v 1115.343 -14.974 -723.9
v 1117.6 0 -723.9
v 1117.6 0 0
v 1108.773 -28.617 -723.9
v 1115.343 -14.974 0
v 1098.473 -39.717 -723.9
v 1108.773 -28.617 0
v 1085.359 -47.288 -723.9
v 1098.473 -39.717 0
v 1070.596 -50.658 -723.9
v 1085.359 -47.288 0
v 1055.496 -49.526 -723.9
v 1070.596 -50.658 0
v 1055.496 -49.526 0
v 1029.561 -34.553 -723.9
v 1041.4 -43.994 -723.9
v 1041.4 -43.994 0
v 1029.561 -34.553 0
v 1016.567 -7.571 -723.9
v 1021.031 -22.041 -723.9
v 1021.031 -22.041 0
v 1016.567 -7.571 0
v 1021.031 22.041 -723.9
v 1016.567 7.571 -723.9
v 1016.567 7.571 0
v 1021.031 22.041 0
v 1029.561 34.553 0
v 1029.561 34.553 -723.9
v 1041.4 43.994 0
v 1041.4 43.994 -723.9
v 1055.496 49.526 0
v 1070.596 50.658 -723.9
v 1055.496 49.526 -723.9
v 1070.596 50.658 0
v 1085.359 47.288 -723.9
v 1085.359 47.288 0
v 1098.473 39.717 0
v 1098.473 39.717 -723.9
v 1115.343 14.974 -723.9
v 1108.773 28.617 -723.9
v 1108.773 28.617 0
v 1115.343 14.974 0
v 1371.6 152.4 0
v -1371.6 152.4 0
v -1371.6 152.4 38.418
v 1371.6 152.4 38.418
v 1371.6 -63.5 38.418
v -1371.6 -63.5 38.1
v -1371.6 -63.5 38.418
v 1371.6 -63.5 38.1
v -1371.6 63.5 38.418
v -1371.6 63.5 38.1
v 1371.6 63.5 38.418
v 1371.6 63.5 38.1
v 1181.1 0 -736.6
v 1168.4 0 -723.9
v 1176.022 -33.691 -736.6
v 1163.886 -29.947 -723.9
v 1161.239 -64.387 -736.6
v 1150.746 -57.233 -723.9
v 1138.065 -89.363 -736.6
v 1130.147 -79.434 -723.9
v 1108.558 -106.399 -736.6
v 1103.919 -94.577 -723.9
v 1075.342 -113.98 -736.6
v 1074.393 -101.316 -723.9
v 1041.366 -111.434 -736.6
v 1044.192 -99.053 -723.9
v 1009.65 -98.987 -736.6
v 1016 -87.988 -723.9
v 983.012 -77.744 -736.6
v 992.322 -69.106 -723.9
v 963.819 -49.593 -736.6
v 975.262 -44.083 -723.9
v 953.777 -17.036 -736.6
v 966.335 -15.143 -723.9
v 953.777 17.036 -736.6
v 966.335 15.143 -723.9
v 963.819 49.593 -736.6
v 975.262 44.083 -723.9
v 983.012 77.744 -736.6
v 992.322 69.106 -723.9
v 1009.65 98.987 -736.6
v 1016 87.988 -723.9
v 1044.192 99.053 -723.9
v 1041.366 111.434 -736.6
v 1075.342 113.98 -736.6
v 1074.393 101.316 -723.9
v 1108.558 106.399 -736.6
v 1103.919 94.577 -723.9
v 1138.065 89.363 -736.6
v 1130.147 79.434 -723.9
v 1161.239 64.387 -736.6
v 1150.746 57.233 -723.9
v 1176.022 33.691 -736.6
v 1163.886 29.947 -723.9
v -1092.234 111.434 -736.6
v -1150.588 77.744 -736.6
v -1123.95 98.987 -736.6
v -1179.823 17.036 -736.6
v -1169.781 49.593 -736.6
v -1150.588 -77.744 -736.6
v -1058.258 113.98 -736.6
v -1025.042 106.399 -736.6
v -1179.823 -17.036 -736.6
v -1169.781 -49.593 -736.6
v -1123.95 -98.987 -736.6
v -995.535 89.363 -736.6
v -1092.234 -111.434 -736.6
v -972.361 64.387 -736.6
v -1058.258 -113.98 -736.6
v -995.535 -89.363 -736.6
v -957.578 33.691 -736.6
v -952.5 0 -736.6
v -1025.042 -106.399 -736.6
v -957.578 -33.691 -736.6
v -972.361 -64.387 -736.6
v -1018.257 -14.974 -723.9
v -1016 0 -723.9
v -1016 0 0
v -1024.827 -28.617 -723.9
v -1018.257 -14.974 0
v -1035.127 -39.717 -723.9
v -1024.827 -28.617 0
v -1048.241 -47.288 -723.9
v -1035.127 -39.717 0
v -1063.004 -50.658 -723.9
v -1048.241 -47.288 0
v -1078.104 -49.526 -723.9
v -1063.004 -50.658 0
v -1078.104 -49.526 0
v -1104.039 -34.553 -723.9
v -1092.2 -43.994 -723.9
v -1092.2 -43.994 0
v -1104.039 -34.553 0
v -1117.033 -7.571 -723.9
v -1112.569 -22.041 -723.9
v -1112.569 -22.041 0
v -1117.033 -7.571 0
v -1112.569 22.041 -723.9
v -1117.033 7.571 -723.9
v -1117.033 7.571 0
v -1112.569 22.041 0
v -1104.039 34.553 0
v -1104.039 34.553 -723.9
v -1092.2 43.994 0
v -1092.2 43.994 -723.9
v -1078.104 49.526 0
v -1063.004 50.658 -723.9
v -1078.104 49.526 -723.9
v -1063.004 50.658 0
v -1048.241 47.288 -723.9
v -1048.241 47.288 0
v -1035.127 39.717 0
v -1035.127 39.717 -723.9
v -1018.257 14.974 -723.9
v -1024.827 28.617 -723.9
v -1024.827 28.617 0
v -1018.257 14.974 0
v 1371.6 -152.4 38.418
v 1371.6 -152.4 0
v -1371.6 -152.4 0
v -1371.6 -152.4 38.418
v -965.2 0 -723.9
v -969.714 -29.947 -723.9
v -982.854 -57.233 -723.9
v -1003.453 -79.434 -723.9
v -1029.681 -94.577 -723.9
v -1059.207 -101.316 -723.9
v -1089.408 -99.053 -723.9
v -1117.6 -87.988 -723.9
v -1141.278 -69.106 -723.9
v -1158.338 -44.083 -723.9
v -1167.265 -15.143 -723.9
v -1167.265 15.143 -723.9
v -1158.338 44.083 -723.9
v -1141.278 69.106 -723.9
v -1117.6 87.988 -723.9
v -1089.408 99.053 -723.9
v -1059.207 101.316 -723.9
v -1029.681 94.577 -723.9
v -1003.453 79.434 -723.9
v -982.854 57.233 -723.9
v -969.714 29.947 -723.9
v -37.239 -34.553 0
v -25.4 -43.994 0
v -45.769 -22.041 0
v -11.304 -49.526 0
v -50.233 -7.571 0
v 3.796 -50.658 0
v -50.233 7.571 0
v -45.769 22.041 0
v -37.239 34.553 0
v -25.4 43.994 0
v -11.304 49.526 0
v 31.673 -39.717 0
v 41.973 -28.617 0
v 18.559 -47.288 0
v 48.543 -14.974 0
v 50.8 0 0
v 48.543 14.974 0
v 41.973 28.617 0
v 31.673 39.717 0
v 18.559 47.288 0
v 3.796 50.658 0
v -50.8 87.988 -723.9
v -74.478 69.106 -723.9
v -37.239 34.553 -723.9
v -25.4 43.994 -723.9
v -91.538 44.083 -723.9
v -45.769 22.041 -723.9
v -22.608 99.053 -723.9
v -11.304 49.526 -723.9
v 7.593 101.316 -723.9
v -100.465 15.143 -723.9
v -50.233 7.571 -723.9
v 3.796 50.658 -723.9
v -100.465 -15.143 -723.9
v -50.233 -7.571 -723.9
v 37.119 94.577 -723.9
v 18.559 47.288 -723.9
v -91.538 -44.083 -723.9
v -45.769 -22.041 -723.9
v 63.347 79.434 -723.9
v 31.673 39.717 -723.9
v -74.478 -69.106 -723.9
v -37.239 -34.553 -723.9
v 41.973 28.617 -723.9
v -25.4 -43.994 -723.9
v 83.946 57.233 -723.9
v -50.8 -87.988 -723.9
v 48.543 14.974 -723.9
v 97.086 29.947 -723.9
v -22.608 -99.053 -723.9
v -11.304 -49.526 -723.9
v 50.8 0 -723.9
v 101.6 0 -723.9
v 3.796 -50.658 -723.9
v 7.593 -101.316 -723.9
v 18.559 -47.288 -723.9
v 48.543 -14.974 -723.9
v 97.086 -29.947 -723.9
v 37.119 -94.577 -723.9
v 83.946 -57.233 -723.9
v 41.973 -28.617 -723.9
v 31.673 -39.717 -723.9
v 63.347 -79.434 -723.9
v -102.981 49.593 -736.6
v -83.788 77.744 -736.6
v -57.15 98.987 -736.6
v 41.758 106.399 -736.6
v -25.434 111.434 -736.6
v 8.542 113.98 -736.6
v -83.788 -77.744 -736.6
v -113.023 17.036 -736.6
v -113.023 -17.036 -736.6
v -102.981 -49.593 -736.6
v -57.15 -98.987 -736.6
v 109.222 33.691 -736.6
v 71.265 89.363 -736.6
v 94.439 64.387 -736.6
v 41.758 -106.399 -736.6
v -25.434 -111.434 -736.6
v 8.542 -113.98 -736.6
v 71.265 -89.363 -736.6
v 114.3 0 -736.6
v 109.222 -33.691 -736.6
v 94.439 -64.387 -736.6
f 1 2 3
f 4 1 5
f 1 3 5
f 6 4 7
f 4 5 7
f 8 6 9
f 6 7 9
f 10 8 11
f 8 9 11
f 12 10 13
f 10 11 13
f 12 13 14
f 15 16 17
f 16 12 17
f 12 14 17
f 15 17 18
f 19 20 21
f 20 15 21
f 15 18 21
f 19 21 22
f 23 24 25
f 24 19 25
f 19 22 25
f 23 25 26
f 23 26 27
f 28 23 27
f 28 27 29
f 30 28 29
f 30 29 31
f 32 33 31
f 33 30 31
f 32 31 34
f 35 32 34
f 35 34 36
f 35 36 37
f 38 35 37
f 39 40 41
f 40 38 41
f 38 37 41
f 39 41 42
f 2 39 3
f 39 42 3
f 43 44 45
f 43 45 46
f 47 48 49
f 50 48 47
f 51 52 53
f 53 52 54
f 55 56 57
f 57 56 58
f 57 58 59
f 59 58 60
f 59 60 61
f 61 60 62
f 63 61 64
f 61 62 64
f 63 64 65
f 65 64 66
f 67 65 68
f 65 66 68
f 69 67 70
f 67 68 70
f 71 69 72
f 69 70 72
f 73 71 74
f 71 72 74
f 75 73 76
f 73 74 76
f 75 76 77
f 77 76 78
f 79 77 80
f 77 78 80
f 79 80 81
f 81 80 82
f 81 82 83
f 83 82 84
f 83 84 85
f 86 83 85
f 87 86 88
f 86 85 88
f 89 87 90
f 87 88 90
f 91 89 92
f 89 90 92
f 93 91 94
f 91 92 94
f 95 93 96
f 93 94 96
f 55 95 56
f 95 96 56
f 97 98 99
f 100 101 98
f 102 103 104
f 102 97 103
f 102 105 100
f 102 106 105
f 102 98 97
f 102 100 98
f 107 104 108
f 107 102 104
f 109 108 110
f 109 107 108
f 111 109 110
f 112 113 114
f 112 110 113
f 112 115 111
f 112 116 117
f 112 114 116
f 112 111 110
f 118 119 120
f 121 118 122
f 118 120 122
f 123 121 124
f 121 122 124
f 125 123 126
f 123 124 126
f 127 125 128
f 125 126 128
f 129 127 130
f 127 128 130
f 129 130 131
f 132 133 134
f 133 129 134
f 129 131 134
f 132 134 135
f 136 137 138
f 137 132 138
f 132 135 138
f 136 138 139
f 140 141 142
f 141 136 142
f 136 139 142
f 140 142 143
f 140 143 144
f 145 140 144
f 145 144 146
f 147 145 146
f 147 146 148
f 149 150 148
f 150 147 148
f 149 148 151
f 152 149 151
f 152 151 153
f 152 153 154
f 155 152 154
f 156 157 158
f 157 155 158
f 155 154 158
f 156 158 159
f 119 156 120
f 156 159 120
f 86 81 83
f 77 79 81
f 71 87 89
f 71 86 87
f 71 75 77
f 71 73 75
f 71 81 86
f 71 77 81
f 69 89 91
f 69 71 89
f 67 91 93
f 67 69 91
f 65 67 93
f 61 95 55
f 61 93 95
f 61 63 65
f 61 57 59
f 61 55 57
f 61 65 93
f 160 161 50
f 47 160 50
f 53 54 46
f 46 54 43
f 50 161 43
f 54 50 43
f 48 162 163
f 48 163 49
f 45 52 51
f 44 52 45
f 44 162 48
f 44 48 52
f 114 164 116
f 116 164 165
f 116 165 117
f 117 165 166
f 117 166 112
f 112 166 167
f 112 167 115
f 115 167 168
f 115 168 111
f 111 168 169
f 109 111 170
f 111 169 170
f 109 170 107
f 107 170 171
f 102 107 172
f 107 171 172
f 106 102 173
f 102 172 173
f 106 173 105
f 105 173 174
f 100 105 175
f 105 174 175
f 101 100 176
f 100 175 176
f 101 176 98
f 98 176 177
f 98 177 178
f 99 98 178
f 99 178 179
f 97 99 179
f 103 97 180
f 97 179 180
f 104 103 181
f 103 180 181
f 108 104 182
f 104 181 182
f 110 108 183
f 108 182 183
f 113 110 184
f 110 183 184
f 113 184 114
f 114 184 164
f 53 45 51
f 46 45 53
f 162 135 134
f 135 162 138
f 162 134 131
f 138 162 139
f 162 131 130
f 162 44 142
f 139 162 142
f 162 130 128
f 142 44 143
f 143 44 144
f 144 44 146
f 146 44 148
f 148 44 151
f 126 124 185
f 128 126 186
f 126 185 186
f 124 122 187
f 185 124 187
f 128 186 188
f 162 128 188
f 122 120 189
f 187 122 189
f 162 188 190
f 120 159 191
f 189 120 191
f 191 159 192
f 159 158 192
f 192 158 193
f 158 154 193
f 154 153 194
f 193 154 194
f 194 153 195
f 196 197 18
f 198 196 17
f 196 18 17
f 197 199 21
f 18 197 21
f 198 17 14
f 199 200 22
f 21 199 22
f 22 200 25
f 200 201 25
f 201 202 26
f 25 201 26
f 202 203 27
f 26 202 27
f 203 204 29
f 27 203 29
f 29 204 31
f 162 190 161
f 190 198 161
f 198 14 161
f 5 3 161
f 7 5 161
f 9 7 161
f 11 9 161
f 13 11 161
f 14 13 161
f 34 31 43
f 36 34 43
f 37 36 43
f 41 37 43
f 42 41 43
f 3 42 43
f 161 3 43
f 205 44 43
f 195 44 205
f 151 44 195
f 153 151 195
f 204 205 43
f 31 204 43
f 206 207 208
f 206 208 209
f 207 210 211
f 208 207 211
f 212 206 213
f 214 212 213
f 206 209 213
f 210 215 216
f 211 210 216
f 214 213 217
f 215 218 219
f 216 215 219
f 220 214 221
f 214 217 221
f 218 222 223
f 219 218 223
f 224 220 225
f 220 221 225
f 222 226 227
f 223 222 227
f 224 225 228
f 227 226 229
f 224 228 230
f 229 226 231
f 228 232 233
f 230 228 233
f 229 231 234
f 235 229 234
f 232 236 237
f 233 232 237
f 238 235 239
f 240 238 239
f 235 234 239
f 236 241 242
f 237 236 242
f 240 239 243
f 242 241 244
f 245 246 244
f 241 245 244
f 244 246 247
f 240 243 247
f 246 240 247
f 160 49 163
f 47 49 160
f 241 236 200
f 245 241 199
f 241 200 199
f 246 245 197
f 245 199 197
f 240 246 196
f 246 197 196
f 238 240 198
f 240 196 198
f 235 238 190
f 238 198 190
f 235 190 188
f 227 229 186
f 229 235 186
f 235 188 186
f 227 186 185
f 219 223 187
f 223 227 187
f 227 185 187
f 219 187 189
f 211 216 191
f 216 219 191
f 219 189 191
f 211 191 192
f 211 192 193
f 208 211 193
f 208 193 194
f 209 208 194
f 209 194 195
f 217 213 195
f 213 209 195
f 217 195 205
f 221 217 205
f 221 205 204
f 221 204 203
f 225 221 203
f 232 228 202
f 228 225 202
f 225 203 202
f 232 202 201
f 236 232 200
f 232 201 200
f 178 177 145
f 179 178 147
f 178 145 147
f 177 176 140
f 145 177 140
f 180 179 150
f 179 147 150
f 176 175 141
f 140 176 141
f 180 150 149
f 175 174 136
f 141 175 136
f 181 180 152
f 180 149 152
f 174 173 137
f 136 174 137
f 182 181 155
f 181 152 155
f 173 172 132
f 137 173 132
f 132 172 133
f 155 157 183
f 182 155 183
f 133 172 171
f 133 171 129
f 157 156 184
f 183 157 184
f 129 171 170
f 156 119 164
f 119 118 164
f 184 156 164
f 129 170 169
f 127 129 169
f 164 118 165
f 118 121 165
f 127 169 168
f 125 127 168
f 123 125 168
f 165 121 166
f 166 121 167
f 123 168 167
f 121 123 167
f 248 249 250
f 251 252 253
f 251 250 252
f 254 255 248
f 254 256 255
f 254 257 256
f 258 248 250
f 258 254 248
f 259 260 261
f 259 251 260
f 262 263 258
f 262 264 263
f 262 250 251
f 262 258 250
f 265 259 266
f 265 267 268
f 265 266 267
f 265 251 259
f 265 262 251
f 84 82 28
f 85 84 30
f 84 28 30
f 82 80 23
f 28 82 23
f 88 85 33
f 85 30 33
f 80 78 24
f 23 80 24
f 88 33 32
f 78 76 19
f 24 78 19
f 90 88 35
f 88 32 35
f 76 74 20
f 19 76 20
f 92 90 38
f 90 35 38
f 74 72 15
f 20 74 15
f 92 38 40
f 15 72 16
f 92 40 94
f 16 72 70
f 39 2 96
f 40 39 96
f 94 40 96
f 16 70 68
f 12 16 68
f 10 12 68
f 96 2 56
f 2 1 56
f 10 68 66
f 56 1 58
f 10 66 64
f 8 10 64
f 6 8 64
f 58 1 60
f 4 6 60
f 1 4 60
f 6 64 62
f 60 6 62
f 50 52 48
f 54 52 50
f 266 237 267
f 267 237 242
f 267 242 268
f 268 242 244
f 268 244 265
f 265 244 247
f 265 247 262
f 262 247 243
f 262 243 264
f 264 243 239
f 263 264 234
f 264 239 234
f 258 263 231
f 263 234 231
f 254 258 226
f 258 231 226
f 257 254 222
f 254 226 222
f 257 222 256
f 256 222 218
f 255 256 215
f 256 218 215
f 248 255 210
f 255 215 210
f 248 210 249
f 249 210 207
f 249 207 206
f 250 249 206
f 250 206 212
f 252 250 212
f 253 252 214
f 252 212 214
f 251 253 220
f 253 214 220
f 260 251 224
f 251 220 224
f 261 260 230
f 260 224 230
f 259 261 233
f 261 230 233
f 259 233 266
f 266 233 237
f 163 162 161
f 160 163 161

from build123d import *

# Parameters (mm, degrees)
F0_W     = 2743.2
F0_H     = 304.8
F1_DEPTH = 38.1
F2_R     = 50.8
F3_DEPTH = 736.6
F4_R     = 114.3
F5_DEPTH = 12.7
F5_TAPER = 45
F6_W     = 2743.2
F6_H     = 88.9
F7_DEPTH = 0.3175


with BuildPart() as f1:
    # F0 (on Top) → F1 (new body)
    with BuildSketch(Plane.XY):
        Rectangle(F0_W, F0_H)
    extrude(amount=F1_DEPTH)

    # F2 (on face) → F3 (join)
    with BuildSketch(Plane(origin=(0, 0, 0), x_dir=(1, 0, 0), z_dir=(0, 0, -1))):
        with Locations((-1066.8, 0)):
            Circle(F2_R)
        with Locations((1066.8, 0)):
            Circle(F2_R)
        Circle(F2_R)
    extrude(amount=F3_DEPTH)

    # F4 (on face) → F5 (join)
    with BuildSketch(Plane(origin=(0, 0, -736.6), x_dir=(1, 0, 0), z_dir=(0, 0, -1))):
        with Locations((-1066.8, 0)):
            Circle(F4_R)
        with Locations((1066.8, 0)):
            Circle(F4_R)
        Circle(F4_R)
    extrude(amount=-F5_DEPTH, taper=F5_TAPER)

    # F6 (on face) → F7 (join)
    with BuildSketch(Plane.XY.offset(38.1)):
        with Locations((0, 107.95)):
            Rectangle(F6_W, F6_H)
        with Locations((0, -107.95)):
            Rectangle(F6_W, F6_H)
    extrude(amount=F7_DEPTH)


solid = f1.part
